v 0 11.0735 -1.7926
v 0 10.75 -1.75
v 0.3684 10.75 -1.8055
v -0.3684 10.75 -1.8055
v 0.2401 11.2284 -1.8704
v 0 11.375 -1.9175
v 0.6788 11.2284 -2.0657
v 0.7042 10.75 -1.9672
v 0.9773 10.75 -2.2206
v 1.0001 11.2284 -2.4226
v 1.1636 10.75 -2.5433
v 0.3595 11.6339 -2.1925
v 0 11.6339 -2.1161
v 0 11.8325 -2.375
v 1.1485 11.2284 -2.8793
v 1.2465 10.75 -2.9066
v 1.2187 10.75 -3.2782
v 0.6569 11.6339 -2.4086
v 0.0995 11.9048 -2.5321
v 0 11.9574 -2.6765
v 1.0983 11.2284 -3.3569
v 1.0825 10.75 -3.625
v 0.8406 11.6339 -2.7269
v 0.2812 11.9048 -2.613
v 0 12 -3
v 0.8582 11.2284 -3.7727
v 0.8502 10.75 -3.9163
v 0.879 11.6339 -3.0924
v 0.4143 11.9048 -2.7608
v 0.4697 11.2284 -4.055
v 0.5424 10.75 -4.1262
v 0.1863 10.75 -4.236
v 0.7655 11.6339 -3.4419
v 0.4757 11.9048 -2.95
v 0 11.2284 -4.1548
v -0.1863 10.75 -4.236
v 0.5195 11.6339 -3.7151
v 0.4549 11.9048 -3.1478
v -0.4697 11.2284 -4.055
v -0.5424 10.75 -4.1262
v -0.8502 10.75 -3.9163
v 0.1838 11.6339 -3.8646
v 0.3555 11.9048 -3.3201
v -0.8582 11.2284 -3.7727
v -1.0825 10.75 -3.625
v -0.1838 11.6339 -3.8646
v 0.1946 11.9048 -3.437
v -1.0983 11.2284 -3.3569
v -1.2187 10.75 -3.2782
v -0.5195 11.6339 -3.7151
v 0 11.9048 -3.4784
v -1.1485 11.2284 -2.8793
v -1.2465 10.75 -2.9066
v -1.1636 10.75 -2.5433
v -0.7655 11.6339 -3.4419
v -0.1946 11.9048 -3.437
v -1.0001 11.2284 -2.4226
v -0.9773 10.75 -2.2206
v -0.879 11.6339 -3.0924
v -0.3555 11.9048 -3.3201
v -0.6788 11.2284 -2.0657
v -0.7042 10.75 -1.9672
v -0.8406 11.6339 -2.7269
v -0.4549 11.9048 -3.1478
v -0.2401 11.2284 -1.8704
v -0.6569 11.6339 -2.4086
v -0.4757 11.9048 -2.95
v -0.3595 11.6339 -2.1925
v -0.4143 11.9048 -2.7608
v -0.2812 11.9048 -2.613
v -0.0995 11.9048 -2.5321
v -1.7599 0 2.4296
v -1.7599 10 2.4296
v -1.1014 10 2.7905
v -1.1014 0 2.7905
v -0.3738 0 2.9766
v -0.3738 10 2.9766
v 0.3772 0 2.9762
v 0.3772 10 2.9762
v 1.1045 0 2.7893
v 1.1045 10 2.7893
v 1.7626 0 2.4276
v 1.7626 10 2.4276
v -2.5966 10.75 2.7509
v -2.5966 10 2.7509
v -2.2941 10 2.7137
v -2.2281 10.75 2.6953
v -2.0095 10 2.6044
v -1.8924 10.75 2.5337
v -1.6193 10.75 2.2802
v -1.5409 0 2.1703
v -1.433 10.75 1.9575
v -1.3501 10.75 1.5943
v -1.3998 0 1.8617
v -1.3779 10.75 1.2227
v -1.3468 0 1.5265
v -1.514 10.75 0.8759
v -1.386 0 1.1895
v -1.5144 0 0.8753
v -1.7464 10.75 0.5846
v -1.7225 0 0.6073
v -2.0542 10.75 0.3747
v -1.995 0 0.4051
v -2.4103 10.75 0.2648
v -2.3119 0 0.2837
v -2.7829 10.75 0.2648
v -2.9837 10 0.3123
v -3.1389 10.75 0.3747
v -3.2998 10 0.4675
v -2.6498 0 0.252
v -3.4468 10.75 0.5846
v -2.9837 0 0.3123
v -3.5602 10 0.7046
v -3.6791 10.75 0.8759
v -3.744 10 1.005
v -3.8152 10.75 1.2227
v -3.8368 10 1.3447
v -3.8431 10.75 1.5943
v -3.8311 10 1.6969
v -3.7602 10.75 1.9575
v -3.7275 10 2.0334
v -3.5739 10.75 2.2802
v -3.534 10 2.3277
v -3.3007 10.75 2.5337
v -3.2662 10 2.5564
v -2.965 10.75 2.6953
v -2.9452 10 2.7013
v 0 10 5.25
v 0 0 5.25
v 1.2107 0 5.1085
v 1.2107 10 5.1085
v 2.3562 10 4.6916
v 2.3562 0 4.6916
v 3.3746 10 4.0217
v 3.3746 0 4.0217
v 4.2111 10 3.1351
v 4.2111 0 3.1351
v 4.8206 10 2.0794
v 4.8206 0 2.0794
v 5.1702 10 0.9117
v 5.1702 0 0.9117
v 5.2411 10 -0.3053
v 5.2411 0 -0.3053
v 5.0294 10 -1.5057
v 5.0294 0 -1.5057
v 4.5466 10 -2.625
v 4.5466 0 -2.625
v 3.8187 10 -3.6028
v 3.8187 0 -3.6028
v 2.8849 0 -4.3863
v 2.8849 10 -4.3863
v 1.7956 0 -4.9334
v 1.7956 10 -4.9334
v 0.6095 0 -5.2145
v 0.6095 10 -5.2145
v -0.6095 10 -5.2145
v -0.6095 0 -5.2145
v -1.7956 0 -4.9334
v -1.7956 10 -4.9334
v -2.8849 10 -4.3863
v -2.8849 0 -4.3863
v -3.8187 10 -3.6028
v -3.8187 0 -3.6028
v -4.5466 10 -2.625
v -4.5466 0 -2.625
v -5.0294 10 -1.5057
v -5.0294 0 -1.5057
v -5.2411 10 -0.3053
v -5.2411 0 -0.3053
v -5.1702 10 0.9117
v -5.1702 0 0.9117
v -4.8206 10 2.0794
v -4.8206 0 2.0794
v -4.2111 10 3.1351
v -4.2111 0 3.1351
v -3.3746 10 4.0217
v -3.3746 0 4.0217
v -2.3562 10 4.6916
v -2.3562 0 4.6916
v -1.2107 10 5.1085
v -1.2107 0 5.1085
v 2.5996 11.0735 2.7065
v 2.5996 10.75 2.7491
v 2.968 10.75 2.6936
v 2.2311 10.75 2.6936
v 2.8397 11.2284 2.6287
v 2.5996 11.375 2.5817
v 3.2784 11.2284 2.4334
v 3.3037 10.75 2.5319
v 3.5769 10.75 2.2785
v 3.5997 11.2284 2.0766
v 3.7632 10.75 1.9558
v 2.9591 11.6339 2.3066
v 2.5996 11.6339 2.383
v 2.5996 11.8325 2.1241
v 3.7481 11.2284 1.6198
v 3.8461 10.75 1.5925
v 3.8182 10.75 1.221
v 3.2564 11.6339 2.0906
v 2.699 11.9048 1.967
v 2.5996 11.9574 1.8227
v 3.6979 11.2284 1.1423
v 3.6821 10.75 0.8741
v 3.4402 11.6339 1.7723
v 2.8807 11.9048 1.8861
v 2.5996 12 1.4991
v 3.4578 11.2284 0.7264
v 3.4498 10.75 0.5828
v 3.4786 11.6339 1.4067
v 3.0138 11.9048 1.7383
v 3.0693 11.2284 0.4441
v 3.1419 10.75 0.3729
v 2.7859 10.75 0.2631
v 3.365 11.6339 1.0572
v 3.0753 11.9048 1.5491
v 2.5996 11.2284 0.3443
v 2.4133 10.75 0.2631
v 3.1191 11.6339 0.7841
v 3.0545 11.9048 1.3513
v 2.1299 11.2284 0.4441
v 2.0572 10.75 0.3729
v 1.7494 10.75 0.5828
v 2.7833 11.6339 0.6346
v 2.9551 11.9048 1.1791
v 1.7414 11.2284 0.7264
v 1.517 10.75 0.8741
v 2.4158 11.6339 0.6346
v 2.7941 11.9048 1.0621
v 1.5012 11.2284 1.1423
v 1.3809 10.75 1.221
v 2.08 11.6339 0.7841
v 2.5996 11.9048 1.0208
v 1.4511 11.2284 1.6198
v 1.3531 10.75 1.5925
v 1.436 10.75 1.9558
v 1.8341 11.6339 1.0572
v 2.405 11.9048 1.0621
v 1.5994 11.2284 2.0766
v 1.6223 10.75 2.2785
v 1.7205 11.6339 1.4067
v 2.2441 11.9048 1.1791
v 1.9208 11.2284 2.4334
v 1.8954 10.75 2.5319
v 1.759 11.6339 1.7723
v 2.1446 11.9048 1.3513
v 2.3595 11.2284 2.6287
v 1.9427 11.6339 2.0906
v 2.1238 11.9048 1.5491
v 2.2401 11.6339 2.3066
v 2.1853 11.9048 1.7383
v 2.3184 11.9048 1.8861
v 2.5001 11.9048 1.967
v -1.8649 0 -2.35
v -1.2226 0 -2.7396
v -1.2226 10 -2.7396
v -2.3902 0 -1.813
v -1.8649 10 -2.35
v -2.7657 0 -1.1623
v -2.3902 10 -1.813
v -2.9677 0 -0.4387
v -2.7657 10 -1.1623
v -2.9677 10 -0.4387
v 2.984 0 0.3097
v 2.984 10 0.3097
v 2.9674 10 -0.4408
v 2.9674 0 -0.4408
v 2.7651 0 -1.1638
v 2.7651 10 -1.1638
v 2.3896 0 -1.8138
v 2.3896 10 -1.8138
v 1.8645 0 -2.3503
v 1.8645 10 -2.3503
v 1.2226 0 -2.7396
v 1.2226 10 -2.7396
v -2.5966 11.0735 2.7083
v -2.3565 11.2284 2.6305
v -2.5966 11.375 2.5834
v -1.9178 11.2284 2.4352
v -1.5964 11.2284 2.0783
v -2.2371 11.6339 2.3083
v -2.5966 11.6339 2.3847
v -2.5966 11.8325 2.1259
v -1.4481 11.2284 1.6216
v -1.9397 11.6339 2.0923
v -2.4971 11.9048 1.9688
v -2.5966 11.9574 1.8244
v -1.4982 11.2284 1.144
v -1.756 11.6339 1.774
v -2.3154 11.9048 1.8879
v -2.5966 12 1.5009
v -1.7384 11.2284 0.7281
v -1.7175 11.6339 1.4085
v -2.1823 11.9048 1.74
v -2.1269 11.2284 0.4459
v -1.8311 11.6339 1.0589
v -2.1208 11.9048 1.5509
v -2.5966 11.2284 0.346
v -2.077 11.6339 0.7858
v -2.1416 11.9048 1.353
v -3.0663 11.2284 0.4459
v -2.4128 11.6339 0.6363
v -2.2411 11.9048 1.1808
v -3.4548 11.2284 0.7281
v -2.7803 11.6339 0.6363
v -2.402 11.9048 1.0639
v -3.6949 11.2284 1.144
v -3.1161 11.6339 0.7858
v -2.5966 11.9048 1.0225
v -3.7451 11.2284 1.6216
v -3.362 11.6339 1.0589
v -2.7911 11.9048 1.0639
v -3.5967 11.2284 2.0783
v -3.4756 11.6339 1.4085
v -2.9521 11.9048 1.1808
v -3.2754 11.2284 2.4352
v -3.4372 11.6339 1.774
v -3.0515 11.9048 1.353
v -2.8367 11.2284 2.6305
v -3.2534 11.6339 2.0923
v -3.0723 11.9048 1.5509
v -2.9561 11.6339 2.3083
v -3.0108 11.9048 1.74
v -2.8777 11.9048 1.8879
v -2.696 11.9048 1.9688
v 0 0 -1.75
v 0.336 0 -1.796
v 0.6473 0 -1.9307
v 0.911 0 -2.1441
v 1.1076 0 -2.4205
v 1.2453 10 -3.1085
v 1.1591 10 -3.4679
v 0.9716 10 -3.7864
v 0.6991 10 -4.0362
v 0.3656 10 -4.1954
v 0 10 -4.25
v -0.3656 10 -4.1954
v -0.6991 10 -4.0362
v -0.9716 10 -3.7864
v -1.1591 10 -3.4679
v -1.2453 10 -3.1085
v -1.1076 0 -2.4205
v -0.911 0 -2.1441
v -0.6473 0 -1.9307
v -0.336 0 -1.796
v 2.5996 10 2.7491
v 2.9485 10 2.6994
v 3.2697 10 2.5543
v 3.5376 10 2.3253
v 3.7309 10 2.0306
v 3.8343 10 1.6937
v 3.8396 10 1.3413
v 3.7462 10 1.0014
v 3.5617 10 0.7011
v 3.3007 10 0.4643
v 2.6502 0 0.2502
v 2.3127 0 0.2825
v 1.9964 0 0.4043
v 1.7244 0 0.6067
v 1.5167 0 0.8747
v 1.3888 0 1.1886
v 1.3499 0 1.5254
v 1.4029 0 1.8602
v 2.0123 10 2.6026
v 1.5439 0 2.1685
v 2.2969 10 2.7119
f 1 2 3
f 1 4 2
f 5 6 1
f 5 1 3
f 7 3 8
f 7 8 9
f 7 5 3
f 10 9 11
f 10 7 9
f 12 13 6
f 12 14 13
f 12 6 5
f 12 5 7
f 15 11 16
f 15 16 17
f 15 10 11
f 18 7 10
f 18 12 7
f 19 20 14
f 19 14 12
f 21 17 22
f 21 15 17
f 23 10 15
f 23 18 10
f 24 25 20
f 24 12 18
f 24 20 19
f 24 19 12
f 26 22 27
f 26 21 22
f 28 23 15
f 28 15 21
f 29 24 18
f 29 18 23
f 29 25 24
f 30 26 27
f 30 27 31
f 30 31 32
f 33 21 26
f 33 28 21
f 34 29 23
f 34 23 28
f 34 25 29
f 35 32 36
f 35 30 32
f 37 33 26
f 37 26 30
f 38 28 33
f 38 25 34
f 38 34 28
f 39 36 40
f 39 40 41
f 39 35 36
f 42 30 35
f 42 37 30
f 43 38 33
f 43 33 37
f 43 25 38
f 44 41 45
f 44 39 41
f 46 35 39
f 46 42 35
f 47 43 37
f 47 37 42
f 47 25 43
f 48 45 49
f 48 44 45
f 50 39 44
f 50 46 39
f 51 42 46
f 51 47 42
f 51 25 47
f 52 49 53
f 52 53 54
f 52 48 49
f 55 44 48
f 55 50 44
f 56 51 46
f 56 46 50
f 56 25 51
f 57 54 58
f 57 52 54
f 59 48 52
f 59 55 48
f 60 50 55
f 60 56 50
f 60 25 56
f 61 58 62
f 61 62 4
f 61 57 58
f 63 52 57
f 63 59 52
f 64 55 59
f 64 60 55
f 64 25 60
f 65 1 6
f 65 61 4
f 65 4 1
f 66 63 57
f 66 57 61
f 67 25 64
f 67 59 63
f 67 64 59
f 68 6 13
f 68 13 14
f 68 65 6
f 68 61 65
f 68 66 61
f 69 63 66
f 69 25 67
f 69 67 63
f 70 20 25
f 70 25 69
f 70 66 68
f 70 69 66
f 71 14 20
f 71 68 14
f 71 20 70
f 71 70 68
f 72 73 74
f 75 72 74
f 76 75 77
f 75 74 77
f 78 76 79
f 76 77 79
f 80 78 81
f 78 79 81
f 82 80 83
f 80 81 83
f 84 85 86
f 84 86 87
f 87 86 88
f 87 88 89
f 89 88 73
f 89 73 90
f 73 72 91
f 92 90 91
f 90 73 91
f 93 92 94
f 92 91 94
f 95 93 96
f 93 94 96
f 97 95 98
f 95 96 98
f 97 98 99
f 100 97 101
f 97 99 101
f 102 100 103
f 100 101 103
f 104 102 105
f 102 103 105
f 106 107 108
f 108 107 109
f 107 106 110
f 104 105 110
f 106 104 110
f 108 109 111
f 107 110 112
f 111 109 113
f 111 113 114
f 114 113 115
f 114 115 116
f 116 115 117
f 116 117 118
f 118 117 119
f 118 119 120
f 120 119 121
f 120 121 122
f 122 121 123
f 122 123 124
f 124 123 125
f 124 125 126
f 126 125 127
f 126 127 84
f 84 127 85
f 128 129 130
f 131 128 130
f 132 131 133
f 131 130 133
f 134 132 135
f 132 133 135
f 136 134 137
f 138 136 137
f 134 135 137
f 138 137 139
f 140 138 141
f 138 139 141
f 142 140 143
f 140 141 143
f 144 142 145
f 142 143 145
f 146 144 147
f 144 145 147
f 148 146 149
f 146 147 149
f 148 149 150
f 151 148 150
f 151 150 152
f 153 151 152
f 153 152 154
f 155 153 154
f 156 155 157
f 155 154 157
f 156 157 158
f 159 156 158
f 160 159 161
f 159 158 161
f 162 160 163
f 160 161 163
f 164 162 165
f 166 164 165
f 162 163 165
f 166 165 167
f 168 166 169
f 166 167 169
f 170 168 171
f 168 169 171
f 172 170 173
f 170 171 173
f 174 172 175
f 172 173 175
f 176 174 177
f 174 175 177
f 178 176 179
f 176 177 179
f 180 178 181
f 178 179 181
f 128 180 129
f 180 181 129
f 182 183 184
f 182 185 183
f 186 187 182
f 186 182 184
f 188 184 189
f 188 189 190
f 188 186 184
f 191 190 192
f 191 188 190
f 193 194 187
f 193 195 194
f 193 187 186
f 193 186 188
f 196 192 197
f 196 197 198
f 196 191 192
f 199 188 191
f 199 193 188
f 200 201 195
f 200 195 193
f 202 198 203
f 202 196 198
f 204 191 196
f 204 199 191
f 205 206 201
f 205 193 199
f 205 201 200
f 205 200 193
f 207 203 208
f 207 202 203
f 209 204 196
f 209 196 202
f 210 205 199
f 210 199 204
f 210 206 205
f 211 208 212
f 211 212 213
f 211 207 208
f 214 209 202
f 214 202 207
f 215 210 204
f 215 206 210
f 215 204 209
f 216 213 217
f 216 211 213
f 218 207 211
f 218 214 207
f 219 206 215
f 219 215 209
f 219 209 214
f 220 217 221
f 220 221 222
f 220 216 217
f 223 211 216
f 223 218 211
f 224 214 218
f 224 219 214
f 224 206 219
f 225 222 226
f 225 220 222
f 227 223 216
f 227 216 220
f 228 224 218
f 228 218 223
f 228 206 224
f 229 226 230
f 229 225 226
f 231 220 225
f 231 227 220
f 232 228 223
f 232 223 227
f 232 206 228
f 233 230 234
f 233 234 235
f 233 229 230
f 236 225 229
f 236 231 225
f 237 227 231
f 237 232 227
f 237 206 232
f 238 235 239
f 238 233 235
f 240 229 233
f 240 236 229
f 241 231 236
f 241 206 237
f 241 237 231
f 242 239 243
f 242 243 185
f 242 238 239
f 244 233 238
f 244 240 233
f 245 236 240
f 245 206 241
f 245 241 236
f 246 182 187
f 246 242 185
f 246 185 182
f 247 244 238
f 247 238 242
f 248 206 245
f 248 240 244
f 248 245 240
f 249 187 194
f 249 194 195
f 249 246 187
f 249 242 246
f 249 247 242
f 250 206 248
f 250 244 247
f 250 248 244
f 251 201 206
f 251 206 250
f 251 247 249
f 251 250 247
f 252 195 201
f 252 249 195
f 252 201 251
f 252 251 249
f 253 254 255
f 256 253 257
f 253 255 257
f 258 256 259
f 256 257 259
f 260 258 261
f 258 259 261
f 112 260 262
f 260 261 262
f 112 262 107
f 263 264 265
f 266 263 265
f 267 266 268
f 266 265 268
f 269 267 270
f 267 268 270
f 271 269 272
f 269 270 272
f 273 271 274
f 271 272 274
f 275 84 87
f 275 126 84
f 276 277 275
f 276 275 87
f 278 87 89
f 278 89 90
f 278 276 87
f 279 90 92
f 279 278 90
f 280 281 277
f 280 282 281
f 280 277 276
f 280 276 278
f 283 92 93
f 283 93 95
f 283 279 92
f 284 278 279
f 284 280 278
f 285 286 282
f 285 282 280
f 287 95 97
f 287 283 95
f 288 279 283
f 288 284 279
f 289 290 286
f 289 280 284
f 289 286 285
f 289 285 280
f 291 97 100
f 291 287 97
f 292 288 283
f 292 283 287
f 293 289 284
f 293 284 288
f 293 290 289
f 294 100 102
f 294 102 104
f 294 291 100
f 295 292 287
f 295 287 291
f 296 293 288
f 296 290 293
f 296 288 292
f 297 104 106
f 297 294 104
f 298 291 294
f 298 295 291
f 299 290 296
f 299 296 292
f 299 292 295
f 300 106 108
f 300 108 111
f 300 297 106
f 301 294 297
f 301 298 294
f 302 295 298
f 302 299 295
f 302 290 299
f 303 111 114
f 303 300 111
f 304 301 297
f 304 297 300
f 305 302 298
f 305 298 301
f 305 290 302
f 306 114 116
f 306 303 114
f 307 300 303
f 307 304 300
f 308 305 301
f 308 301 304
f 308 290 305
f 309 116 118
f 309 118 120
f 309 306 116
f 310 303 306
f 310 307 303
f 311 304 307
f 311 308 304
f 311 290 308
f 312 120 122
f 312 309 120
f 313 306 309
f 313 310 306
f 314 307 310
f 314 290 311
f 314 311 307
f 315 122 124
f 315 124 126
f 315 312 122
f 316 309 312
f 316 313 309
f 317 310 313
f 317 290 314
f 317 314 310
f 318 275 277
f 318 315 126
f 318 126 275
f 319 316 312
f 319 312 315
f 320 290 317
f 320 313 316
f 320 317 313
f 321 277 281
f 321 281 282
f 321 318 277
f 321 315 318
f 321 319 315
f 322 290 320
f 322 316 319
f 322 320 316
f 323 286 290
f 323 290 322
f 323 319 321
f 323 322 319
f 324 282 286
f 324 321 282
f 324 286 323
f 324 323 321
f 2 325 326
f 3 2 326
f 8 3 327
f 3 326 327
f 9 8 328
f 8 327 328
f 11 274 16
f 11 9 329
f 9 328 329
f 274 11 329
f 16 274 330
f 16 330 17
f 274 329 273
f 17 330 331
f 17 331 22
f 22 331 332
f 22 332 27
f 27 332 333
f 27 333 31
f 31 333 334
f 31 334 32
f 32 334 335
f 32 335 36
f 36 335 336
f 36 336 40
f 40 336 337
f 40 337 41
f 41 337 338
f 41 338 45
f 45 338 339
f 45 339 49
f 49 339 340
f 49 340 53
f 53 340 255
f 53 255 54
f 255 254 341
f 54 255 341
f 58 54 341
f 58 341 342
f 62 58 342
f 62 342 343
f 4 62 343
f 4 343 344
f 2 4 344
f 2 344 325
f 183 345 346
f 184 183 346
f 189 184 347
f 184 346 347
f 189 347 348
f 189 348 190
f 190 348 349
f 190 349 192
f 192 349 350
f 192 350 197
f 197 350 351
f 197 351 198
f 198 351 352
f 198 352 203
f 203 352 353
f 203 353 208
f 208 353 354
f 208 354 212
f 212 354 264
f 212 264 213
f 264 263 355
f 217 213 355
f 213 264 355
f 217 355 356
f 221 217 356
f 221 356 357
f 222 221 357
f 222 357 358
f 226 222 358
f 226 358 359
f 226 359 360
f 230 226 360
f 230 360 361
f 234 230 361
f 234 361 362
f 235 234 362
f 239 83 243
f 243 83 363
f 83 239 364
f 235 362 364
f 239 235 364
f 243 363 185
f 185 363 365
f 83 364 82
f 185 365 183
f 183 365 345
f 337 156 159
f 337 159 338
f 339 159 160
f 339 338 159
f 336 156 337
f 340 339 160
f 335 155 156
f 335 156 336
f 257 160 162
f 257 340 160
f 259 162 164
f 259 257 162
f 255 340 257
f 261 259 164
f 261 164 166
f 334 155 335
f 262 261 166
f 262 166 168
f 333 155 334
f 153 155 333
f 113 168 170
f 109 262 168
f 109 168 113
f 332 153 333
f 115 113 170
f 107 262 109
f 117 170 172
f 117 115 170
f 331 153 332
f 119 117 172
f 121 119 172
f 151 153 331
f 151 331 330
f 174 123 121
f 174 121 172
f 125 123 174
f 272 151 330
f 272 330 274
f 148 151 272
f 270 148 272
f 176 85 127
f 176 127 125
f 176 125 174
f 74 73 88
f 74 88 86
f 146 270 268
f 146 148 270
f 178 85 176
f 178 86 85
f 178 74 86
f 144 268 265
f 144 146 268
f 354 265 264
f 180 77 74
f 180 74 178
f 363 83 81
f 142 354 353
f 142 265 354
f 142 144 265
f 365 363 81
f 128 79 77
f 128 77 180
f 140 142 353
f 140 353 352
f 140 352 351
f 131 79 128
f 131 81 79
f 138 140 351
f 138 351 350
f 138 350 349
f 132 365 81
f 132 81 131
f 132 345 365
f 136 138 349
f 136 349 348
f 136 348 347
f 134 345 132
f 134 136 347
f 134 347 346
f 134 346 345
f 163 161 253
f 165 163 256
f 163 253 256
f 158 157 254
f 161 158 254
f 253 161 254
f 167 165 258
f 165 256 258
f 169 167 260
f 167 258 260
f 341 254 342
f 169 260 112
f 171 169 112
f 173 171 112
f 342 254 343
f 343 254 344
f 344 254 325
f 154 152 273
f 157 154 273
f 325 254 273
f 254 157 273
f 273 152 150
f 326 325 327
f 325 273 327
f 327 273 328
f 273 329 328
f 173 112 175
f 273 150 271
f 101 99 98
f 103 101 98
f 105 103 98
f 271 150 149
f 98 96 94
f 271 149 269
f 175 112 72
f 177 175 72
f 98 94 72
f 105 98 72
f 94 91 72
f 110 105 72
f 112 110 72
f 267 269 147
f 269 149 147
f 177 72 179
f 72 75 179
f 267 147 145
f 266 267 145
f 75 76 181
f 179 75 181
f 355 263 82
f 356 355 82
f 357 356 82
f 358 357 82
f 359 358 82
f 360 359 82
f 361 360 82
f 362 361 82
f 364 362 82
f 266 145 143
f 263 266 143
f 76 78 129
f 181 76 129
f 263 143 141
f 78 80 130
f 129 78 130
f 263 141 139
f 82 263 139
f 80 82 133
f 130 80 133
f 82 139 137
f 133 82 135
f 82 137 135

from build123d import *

# Parameters (mm, degrees)
CROQUIS1_R                   = 5.25
SALIENTE_EXTRUIR1_DEPTH      = 10
CROQUIS2_R                   = 3
CORTAR_EXTRUIR1_DEPTH        = 10
SALIENTE_EXTRUIR2_DEPTH      = 2
SALIENTE_EXTRUIR2_DEPTH_BACK = 10
CROQUIS3_R                   = 1.25
REDONDEO1_R                  = 1.25


with BuildPart() as part:
    # Croquis1 → Saliente-Extruir1 (new body)
    with BuildSketch(Plane(origin=(0, 0, 0), x_dir=(1, 0, 0), z_dir=(0, 1, 0))):
        with Locations(Location((0, 0, 0), (0, 0, 270))):
            Circle(CROQUIS1_R)
    extrude(amount=SALIENTE_EXTRUIR1_DEPTH)

    # Croquis2 → Cortar-Extruir1 (cut)
    with BuildSketch(Plane(origin=(0, 10, 0), x_dir=(1, 0, 0), z_dir=(0, 1, 0))):
        with Locations(Location((0, 0, 0), (0, 0, 270))):
            Circle(CROQUIS2_R)
    extrude(amount=-CORTAR_EXTRUIR1_DEPTH, mode=Mode.SUBTRACT)

    # Croquis3 → Saliente-Extruir2 (add, two sides: drawn at the far end of the back side and taken through both)
    with BuildSketch(Plane(origin=(0, 10, 0), x_dir=(1, 0, 0), z_dir=(0, 1, 0)).offset(-SALIENTE_EXTRUIR2_DEPTH_BACK)):
        with Locations(Location((0, 3, 0), (0, 0, 270))):
            Circle(CROQUIS3_R)
        with Locations(Location((2.599576211, -1.499133975, 0), (0, 0, 270))):
            Circle(CROQUIS3_R)
        with Locations(Location((-2.596576211, -1.500866025, 0), (0, 0, 270))):
            Circle(CROQUIS3_R)
    extrude(amount=SALIENTE_EXTRUIR2_DEPTH + SALIENTE_EXTRUIR2_DEPTH_BACK)

    # Redondeo1
    redondeo1_edges = [part.edges().sort_by_distance(p)[0] for p in [
        (0, 12, -4.25),
        (2.599576211, 12, 0.249133975),
        (-2.596576211, 12, 0.250866025),
    ]]
    fillet(redondeo1_edges, radius=REDONDEO1_R)


solid = part.part
